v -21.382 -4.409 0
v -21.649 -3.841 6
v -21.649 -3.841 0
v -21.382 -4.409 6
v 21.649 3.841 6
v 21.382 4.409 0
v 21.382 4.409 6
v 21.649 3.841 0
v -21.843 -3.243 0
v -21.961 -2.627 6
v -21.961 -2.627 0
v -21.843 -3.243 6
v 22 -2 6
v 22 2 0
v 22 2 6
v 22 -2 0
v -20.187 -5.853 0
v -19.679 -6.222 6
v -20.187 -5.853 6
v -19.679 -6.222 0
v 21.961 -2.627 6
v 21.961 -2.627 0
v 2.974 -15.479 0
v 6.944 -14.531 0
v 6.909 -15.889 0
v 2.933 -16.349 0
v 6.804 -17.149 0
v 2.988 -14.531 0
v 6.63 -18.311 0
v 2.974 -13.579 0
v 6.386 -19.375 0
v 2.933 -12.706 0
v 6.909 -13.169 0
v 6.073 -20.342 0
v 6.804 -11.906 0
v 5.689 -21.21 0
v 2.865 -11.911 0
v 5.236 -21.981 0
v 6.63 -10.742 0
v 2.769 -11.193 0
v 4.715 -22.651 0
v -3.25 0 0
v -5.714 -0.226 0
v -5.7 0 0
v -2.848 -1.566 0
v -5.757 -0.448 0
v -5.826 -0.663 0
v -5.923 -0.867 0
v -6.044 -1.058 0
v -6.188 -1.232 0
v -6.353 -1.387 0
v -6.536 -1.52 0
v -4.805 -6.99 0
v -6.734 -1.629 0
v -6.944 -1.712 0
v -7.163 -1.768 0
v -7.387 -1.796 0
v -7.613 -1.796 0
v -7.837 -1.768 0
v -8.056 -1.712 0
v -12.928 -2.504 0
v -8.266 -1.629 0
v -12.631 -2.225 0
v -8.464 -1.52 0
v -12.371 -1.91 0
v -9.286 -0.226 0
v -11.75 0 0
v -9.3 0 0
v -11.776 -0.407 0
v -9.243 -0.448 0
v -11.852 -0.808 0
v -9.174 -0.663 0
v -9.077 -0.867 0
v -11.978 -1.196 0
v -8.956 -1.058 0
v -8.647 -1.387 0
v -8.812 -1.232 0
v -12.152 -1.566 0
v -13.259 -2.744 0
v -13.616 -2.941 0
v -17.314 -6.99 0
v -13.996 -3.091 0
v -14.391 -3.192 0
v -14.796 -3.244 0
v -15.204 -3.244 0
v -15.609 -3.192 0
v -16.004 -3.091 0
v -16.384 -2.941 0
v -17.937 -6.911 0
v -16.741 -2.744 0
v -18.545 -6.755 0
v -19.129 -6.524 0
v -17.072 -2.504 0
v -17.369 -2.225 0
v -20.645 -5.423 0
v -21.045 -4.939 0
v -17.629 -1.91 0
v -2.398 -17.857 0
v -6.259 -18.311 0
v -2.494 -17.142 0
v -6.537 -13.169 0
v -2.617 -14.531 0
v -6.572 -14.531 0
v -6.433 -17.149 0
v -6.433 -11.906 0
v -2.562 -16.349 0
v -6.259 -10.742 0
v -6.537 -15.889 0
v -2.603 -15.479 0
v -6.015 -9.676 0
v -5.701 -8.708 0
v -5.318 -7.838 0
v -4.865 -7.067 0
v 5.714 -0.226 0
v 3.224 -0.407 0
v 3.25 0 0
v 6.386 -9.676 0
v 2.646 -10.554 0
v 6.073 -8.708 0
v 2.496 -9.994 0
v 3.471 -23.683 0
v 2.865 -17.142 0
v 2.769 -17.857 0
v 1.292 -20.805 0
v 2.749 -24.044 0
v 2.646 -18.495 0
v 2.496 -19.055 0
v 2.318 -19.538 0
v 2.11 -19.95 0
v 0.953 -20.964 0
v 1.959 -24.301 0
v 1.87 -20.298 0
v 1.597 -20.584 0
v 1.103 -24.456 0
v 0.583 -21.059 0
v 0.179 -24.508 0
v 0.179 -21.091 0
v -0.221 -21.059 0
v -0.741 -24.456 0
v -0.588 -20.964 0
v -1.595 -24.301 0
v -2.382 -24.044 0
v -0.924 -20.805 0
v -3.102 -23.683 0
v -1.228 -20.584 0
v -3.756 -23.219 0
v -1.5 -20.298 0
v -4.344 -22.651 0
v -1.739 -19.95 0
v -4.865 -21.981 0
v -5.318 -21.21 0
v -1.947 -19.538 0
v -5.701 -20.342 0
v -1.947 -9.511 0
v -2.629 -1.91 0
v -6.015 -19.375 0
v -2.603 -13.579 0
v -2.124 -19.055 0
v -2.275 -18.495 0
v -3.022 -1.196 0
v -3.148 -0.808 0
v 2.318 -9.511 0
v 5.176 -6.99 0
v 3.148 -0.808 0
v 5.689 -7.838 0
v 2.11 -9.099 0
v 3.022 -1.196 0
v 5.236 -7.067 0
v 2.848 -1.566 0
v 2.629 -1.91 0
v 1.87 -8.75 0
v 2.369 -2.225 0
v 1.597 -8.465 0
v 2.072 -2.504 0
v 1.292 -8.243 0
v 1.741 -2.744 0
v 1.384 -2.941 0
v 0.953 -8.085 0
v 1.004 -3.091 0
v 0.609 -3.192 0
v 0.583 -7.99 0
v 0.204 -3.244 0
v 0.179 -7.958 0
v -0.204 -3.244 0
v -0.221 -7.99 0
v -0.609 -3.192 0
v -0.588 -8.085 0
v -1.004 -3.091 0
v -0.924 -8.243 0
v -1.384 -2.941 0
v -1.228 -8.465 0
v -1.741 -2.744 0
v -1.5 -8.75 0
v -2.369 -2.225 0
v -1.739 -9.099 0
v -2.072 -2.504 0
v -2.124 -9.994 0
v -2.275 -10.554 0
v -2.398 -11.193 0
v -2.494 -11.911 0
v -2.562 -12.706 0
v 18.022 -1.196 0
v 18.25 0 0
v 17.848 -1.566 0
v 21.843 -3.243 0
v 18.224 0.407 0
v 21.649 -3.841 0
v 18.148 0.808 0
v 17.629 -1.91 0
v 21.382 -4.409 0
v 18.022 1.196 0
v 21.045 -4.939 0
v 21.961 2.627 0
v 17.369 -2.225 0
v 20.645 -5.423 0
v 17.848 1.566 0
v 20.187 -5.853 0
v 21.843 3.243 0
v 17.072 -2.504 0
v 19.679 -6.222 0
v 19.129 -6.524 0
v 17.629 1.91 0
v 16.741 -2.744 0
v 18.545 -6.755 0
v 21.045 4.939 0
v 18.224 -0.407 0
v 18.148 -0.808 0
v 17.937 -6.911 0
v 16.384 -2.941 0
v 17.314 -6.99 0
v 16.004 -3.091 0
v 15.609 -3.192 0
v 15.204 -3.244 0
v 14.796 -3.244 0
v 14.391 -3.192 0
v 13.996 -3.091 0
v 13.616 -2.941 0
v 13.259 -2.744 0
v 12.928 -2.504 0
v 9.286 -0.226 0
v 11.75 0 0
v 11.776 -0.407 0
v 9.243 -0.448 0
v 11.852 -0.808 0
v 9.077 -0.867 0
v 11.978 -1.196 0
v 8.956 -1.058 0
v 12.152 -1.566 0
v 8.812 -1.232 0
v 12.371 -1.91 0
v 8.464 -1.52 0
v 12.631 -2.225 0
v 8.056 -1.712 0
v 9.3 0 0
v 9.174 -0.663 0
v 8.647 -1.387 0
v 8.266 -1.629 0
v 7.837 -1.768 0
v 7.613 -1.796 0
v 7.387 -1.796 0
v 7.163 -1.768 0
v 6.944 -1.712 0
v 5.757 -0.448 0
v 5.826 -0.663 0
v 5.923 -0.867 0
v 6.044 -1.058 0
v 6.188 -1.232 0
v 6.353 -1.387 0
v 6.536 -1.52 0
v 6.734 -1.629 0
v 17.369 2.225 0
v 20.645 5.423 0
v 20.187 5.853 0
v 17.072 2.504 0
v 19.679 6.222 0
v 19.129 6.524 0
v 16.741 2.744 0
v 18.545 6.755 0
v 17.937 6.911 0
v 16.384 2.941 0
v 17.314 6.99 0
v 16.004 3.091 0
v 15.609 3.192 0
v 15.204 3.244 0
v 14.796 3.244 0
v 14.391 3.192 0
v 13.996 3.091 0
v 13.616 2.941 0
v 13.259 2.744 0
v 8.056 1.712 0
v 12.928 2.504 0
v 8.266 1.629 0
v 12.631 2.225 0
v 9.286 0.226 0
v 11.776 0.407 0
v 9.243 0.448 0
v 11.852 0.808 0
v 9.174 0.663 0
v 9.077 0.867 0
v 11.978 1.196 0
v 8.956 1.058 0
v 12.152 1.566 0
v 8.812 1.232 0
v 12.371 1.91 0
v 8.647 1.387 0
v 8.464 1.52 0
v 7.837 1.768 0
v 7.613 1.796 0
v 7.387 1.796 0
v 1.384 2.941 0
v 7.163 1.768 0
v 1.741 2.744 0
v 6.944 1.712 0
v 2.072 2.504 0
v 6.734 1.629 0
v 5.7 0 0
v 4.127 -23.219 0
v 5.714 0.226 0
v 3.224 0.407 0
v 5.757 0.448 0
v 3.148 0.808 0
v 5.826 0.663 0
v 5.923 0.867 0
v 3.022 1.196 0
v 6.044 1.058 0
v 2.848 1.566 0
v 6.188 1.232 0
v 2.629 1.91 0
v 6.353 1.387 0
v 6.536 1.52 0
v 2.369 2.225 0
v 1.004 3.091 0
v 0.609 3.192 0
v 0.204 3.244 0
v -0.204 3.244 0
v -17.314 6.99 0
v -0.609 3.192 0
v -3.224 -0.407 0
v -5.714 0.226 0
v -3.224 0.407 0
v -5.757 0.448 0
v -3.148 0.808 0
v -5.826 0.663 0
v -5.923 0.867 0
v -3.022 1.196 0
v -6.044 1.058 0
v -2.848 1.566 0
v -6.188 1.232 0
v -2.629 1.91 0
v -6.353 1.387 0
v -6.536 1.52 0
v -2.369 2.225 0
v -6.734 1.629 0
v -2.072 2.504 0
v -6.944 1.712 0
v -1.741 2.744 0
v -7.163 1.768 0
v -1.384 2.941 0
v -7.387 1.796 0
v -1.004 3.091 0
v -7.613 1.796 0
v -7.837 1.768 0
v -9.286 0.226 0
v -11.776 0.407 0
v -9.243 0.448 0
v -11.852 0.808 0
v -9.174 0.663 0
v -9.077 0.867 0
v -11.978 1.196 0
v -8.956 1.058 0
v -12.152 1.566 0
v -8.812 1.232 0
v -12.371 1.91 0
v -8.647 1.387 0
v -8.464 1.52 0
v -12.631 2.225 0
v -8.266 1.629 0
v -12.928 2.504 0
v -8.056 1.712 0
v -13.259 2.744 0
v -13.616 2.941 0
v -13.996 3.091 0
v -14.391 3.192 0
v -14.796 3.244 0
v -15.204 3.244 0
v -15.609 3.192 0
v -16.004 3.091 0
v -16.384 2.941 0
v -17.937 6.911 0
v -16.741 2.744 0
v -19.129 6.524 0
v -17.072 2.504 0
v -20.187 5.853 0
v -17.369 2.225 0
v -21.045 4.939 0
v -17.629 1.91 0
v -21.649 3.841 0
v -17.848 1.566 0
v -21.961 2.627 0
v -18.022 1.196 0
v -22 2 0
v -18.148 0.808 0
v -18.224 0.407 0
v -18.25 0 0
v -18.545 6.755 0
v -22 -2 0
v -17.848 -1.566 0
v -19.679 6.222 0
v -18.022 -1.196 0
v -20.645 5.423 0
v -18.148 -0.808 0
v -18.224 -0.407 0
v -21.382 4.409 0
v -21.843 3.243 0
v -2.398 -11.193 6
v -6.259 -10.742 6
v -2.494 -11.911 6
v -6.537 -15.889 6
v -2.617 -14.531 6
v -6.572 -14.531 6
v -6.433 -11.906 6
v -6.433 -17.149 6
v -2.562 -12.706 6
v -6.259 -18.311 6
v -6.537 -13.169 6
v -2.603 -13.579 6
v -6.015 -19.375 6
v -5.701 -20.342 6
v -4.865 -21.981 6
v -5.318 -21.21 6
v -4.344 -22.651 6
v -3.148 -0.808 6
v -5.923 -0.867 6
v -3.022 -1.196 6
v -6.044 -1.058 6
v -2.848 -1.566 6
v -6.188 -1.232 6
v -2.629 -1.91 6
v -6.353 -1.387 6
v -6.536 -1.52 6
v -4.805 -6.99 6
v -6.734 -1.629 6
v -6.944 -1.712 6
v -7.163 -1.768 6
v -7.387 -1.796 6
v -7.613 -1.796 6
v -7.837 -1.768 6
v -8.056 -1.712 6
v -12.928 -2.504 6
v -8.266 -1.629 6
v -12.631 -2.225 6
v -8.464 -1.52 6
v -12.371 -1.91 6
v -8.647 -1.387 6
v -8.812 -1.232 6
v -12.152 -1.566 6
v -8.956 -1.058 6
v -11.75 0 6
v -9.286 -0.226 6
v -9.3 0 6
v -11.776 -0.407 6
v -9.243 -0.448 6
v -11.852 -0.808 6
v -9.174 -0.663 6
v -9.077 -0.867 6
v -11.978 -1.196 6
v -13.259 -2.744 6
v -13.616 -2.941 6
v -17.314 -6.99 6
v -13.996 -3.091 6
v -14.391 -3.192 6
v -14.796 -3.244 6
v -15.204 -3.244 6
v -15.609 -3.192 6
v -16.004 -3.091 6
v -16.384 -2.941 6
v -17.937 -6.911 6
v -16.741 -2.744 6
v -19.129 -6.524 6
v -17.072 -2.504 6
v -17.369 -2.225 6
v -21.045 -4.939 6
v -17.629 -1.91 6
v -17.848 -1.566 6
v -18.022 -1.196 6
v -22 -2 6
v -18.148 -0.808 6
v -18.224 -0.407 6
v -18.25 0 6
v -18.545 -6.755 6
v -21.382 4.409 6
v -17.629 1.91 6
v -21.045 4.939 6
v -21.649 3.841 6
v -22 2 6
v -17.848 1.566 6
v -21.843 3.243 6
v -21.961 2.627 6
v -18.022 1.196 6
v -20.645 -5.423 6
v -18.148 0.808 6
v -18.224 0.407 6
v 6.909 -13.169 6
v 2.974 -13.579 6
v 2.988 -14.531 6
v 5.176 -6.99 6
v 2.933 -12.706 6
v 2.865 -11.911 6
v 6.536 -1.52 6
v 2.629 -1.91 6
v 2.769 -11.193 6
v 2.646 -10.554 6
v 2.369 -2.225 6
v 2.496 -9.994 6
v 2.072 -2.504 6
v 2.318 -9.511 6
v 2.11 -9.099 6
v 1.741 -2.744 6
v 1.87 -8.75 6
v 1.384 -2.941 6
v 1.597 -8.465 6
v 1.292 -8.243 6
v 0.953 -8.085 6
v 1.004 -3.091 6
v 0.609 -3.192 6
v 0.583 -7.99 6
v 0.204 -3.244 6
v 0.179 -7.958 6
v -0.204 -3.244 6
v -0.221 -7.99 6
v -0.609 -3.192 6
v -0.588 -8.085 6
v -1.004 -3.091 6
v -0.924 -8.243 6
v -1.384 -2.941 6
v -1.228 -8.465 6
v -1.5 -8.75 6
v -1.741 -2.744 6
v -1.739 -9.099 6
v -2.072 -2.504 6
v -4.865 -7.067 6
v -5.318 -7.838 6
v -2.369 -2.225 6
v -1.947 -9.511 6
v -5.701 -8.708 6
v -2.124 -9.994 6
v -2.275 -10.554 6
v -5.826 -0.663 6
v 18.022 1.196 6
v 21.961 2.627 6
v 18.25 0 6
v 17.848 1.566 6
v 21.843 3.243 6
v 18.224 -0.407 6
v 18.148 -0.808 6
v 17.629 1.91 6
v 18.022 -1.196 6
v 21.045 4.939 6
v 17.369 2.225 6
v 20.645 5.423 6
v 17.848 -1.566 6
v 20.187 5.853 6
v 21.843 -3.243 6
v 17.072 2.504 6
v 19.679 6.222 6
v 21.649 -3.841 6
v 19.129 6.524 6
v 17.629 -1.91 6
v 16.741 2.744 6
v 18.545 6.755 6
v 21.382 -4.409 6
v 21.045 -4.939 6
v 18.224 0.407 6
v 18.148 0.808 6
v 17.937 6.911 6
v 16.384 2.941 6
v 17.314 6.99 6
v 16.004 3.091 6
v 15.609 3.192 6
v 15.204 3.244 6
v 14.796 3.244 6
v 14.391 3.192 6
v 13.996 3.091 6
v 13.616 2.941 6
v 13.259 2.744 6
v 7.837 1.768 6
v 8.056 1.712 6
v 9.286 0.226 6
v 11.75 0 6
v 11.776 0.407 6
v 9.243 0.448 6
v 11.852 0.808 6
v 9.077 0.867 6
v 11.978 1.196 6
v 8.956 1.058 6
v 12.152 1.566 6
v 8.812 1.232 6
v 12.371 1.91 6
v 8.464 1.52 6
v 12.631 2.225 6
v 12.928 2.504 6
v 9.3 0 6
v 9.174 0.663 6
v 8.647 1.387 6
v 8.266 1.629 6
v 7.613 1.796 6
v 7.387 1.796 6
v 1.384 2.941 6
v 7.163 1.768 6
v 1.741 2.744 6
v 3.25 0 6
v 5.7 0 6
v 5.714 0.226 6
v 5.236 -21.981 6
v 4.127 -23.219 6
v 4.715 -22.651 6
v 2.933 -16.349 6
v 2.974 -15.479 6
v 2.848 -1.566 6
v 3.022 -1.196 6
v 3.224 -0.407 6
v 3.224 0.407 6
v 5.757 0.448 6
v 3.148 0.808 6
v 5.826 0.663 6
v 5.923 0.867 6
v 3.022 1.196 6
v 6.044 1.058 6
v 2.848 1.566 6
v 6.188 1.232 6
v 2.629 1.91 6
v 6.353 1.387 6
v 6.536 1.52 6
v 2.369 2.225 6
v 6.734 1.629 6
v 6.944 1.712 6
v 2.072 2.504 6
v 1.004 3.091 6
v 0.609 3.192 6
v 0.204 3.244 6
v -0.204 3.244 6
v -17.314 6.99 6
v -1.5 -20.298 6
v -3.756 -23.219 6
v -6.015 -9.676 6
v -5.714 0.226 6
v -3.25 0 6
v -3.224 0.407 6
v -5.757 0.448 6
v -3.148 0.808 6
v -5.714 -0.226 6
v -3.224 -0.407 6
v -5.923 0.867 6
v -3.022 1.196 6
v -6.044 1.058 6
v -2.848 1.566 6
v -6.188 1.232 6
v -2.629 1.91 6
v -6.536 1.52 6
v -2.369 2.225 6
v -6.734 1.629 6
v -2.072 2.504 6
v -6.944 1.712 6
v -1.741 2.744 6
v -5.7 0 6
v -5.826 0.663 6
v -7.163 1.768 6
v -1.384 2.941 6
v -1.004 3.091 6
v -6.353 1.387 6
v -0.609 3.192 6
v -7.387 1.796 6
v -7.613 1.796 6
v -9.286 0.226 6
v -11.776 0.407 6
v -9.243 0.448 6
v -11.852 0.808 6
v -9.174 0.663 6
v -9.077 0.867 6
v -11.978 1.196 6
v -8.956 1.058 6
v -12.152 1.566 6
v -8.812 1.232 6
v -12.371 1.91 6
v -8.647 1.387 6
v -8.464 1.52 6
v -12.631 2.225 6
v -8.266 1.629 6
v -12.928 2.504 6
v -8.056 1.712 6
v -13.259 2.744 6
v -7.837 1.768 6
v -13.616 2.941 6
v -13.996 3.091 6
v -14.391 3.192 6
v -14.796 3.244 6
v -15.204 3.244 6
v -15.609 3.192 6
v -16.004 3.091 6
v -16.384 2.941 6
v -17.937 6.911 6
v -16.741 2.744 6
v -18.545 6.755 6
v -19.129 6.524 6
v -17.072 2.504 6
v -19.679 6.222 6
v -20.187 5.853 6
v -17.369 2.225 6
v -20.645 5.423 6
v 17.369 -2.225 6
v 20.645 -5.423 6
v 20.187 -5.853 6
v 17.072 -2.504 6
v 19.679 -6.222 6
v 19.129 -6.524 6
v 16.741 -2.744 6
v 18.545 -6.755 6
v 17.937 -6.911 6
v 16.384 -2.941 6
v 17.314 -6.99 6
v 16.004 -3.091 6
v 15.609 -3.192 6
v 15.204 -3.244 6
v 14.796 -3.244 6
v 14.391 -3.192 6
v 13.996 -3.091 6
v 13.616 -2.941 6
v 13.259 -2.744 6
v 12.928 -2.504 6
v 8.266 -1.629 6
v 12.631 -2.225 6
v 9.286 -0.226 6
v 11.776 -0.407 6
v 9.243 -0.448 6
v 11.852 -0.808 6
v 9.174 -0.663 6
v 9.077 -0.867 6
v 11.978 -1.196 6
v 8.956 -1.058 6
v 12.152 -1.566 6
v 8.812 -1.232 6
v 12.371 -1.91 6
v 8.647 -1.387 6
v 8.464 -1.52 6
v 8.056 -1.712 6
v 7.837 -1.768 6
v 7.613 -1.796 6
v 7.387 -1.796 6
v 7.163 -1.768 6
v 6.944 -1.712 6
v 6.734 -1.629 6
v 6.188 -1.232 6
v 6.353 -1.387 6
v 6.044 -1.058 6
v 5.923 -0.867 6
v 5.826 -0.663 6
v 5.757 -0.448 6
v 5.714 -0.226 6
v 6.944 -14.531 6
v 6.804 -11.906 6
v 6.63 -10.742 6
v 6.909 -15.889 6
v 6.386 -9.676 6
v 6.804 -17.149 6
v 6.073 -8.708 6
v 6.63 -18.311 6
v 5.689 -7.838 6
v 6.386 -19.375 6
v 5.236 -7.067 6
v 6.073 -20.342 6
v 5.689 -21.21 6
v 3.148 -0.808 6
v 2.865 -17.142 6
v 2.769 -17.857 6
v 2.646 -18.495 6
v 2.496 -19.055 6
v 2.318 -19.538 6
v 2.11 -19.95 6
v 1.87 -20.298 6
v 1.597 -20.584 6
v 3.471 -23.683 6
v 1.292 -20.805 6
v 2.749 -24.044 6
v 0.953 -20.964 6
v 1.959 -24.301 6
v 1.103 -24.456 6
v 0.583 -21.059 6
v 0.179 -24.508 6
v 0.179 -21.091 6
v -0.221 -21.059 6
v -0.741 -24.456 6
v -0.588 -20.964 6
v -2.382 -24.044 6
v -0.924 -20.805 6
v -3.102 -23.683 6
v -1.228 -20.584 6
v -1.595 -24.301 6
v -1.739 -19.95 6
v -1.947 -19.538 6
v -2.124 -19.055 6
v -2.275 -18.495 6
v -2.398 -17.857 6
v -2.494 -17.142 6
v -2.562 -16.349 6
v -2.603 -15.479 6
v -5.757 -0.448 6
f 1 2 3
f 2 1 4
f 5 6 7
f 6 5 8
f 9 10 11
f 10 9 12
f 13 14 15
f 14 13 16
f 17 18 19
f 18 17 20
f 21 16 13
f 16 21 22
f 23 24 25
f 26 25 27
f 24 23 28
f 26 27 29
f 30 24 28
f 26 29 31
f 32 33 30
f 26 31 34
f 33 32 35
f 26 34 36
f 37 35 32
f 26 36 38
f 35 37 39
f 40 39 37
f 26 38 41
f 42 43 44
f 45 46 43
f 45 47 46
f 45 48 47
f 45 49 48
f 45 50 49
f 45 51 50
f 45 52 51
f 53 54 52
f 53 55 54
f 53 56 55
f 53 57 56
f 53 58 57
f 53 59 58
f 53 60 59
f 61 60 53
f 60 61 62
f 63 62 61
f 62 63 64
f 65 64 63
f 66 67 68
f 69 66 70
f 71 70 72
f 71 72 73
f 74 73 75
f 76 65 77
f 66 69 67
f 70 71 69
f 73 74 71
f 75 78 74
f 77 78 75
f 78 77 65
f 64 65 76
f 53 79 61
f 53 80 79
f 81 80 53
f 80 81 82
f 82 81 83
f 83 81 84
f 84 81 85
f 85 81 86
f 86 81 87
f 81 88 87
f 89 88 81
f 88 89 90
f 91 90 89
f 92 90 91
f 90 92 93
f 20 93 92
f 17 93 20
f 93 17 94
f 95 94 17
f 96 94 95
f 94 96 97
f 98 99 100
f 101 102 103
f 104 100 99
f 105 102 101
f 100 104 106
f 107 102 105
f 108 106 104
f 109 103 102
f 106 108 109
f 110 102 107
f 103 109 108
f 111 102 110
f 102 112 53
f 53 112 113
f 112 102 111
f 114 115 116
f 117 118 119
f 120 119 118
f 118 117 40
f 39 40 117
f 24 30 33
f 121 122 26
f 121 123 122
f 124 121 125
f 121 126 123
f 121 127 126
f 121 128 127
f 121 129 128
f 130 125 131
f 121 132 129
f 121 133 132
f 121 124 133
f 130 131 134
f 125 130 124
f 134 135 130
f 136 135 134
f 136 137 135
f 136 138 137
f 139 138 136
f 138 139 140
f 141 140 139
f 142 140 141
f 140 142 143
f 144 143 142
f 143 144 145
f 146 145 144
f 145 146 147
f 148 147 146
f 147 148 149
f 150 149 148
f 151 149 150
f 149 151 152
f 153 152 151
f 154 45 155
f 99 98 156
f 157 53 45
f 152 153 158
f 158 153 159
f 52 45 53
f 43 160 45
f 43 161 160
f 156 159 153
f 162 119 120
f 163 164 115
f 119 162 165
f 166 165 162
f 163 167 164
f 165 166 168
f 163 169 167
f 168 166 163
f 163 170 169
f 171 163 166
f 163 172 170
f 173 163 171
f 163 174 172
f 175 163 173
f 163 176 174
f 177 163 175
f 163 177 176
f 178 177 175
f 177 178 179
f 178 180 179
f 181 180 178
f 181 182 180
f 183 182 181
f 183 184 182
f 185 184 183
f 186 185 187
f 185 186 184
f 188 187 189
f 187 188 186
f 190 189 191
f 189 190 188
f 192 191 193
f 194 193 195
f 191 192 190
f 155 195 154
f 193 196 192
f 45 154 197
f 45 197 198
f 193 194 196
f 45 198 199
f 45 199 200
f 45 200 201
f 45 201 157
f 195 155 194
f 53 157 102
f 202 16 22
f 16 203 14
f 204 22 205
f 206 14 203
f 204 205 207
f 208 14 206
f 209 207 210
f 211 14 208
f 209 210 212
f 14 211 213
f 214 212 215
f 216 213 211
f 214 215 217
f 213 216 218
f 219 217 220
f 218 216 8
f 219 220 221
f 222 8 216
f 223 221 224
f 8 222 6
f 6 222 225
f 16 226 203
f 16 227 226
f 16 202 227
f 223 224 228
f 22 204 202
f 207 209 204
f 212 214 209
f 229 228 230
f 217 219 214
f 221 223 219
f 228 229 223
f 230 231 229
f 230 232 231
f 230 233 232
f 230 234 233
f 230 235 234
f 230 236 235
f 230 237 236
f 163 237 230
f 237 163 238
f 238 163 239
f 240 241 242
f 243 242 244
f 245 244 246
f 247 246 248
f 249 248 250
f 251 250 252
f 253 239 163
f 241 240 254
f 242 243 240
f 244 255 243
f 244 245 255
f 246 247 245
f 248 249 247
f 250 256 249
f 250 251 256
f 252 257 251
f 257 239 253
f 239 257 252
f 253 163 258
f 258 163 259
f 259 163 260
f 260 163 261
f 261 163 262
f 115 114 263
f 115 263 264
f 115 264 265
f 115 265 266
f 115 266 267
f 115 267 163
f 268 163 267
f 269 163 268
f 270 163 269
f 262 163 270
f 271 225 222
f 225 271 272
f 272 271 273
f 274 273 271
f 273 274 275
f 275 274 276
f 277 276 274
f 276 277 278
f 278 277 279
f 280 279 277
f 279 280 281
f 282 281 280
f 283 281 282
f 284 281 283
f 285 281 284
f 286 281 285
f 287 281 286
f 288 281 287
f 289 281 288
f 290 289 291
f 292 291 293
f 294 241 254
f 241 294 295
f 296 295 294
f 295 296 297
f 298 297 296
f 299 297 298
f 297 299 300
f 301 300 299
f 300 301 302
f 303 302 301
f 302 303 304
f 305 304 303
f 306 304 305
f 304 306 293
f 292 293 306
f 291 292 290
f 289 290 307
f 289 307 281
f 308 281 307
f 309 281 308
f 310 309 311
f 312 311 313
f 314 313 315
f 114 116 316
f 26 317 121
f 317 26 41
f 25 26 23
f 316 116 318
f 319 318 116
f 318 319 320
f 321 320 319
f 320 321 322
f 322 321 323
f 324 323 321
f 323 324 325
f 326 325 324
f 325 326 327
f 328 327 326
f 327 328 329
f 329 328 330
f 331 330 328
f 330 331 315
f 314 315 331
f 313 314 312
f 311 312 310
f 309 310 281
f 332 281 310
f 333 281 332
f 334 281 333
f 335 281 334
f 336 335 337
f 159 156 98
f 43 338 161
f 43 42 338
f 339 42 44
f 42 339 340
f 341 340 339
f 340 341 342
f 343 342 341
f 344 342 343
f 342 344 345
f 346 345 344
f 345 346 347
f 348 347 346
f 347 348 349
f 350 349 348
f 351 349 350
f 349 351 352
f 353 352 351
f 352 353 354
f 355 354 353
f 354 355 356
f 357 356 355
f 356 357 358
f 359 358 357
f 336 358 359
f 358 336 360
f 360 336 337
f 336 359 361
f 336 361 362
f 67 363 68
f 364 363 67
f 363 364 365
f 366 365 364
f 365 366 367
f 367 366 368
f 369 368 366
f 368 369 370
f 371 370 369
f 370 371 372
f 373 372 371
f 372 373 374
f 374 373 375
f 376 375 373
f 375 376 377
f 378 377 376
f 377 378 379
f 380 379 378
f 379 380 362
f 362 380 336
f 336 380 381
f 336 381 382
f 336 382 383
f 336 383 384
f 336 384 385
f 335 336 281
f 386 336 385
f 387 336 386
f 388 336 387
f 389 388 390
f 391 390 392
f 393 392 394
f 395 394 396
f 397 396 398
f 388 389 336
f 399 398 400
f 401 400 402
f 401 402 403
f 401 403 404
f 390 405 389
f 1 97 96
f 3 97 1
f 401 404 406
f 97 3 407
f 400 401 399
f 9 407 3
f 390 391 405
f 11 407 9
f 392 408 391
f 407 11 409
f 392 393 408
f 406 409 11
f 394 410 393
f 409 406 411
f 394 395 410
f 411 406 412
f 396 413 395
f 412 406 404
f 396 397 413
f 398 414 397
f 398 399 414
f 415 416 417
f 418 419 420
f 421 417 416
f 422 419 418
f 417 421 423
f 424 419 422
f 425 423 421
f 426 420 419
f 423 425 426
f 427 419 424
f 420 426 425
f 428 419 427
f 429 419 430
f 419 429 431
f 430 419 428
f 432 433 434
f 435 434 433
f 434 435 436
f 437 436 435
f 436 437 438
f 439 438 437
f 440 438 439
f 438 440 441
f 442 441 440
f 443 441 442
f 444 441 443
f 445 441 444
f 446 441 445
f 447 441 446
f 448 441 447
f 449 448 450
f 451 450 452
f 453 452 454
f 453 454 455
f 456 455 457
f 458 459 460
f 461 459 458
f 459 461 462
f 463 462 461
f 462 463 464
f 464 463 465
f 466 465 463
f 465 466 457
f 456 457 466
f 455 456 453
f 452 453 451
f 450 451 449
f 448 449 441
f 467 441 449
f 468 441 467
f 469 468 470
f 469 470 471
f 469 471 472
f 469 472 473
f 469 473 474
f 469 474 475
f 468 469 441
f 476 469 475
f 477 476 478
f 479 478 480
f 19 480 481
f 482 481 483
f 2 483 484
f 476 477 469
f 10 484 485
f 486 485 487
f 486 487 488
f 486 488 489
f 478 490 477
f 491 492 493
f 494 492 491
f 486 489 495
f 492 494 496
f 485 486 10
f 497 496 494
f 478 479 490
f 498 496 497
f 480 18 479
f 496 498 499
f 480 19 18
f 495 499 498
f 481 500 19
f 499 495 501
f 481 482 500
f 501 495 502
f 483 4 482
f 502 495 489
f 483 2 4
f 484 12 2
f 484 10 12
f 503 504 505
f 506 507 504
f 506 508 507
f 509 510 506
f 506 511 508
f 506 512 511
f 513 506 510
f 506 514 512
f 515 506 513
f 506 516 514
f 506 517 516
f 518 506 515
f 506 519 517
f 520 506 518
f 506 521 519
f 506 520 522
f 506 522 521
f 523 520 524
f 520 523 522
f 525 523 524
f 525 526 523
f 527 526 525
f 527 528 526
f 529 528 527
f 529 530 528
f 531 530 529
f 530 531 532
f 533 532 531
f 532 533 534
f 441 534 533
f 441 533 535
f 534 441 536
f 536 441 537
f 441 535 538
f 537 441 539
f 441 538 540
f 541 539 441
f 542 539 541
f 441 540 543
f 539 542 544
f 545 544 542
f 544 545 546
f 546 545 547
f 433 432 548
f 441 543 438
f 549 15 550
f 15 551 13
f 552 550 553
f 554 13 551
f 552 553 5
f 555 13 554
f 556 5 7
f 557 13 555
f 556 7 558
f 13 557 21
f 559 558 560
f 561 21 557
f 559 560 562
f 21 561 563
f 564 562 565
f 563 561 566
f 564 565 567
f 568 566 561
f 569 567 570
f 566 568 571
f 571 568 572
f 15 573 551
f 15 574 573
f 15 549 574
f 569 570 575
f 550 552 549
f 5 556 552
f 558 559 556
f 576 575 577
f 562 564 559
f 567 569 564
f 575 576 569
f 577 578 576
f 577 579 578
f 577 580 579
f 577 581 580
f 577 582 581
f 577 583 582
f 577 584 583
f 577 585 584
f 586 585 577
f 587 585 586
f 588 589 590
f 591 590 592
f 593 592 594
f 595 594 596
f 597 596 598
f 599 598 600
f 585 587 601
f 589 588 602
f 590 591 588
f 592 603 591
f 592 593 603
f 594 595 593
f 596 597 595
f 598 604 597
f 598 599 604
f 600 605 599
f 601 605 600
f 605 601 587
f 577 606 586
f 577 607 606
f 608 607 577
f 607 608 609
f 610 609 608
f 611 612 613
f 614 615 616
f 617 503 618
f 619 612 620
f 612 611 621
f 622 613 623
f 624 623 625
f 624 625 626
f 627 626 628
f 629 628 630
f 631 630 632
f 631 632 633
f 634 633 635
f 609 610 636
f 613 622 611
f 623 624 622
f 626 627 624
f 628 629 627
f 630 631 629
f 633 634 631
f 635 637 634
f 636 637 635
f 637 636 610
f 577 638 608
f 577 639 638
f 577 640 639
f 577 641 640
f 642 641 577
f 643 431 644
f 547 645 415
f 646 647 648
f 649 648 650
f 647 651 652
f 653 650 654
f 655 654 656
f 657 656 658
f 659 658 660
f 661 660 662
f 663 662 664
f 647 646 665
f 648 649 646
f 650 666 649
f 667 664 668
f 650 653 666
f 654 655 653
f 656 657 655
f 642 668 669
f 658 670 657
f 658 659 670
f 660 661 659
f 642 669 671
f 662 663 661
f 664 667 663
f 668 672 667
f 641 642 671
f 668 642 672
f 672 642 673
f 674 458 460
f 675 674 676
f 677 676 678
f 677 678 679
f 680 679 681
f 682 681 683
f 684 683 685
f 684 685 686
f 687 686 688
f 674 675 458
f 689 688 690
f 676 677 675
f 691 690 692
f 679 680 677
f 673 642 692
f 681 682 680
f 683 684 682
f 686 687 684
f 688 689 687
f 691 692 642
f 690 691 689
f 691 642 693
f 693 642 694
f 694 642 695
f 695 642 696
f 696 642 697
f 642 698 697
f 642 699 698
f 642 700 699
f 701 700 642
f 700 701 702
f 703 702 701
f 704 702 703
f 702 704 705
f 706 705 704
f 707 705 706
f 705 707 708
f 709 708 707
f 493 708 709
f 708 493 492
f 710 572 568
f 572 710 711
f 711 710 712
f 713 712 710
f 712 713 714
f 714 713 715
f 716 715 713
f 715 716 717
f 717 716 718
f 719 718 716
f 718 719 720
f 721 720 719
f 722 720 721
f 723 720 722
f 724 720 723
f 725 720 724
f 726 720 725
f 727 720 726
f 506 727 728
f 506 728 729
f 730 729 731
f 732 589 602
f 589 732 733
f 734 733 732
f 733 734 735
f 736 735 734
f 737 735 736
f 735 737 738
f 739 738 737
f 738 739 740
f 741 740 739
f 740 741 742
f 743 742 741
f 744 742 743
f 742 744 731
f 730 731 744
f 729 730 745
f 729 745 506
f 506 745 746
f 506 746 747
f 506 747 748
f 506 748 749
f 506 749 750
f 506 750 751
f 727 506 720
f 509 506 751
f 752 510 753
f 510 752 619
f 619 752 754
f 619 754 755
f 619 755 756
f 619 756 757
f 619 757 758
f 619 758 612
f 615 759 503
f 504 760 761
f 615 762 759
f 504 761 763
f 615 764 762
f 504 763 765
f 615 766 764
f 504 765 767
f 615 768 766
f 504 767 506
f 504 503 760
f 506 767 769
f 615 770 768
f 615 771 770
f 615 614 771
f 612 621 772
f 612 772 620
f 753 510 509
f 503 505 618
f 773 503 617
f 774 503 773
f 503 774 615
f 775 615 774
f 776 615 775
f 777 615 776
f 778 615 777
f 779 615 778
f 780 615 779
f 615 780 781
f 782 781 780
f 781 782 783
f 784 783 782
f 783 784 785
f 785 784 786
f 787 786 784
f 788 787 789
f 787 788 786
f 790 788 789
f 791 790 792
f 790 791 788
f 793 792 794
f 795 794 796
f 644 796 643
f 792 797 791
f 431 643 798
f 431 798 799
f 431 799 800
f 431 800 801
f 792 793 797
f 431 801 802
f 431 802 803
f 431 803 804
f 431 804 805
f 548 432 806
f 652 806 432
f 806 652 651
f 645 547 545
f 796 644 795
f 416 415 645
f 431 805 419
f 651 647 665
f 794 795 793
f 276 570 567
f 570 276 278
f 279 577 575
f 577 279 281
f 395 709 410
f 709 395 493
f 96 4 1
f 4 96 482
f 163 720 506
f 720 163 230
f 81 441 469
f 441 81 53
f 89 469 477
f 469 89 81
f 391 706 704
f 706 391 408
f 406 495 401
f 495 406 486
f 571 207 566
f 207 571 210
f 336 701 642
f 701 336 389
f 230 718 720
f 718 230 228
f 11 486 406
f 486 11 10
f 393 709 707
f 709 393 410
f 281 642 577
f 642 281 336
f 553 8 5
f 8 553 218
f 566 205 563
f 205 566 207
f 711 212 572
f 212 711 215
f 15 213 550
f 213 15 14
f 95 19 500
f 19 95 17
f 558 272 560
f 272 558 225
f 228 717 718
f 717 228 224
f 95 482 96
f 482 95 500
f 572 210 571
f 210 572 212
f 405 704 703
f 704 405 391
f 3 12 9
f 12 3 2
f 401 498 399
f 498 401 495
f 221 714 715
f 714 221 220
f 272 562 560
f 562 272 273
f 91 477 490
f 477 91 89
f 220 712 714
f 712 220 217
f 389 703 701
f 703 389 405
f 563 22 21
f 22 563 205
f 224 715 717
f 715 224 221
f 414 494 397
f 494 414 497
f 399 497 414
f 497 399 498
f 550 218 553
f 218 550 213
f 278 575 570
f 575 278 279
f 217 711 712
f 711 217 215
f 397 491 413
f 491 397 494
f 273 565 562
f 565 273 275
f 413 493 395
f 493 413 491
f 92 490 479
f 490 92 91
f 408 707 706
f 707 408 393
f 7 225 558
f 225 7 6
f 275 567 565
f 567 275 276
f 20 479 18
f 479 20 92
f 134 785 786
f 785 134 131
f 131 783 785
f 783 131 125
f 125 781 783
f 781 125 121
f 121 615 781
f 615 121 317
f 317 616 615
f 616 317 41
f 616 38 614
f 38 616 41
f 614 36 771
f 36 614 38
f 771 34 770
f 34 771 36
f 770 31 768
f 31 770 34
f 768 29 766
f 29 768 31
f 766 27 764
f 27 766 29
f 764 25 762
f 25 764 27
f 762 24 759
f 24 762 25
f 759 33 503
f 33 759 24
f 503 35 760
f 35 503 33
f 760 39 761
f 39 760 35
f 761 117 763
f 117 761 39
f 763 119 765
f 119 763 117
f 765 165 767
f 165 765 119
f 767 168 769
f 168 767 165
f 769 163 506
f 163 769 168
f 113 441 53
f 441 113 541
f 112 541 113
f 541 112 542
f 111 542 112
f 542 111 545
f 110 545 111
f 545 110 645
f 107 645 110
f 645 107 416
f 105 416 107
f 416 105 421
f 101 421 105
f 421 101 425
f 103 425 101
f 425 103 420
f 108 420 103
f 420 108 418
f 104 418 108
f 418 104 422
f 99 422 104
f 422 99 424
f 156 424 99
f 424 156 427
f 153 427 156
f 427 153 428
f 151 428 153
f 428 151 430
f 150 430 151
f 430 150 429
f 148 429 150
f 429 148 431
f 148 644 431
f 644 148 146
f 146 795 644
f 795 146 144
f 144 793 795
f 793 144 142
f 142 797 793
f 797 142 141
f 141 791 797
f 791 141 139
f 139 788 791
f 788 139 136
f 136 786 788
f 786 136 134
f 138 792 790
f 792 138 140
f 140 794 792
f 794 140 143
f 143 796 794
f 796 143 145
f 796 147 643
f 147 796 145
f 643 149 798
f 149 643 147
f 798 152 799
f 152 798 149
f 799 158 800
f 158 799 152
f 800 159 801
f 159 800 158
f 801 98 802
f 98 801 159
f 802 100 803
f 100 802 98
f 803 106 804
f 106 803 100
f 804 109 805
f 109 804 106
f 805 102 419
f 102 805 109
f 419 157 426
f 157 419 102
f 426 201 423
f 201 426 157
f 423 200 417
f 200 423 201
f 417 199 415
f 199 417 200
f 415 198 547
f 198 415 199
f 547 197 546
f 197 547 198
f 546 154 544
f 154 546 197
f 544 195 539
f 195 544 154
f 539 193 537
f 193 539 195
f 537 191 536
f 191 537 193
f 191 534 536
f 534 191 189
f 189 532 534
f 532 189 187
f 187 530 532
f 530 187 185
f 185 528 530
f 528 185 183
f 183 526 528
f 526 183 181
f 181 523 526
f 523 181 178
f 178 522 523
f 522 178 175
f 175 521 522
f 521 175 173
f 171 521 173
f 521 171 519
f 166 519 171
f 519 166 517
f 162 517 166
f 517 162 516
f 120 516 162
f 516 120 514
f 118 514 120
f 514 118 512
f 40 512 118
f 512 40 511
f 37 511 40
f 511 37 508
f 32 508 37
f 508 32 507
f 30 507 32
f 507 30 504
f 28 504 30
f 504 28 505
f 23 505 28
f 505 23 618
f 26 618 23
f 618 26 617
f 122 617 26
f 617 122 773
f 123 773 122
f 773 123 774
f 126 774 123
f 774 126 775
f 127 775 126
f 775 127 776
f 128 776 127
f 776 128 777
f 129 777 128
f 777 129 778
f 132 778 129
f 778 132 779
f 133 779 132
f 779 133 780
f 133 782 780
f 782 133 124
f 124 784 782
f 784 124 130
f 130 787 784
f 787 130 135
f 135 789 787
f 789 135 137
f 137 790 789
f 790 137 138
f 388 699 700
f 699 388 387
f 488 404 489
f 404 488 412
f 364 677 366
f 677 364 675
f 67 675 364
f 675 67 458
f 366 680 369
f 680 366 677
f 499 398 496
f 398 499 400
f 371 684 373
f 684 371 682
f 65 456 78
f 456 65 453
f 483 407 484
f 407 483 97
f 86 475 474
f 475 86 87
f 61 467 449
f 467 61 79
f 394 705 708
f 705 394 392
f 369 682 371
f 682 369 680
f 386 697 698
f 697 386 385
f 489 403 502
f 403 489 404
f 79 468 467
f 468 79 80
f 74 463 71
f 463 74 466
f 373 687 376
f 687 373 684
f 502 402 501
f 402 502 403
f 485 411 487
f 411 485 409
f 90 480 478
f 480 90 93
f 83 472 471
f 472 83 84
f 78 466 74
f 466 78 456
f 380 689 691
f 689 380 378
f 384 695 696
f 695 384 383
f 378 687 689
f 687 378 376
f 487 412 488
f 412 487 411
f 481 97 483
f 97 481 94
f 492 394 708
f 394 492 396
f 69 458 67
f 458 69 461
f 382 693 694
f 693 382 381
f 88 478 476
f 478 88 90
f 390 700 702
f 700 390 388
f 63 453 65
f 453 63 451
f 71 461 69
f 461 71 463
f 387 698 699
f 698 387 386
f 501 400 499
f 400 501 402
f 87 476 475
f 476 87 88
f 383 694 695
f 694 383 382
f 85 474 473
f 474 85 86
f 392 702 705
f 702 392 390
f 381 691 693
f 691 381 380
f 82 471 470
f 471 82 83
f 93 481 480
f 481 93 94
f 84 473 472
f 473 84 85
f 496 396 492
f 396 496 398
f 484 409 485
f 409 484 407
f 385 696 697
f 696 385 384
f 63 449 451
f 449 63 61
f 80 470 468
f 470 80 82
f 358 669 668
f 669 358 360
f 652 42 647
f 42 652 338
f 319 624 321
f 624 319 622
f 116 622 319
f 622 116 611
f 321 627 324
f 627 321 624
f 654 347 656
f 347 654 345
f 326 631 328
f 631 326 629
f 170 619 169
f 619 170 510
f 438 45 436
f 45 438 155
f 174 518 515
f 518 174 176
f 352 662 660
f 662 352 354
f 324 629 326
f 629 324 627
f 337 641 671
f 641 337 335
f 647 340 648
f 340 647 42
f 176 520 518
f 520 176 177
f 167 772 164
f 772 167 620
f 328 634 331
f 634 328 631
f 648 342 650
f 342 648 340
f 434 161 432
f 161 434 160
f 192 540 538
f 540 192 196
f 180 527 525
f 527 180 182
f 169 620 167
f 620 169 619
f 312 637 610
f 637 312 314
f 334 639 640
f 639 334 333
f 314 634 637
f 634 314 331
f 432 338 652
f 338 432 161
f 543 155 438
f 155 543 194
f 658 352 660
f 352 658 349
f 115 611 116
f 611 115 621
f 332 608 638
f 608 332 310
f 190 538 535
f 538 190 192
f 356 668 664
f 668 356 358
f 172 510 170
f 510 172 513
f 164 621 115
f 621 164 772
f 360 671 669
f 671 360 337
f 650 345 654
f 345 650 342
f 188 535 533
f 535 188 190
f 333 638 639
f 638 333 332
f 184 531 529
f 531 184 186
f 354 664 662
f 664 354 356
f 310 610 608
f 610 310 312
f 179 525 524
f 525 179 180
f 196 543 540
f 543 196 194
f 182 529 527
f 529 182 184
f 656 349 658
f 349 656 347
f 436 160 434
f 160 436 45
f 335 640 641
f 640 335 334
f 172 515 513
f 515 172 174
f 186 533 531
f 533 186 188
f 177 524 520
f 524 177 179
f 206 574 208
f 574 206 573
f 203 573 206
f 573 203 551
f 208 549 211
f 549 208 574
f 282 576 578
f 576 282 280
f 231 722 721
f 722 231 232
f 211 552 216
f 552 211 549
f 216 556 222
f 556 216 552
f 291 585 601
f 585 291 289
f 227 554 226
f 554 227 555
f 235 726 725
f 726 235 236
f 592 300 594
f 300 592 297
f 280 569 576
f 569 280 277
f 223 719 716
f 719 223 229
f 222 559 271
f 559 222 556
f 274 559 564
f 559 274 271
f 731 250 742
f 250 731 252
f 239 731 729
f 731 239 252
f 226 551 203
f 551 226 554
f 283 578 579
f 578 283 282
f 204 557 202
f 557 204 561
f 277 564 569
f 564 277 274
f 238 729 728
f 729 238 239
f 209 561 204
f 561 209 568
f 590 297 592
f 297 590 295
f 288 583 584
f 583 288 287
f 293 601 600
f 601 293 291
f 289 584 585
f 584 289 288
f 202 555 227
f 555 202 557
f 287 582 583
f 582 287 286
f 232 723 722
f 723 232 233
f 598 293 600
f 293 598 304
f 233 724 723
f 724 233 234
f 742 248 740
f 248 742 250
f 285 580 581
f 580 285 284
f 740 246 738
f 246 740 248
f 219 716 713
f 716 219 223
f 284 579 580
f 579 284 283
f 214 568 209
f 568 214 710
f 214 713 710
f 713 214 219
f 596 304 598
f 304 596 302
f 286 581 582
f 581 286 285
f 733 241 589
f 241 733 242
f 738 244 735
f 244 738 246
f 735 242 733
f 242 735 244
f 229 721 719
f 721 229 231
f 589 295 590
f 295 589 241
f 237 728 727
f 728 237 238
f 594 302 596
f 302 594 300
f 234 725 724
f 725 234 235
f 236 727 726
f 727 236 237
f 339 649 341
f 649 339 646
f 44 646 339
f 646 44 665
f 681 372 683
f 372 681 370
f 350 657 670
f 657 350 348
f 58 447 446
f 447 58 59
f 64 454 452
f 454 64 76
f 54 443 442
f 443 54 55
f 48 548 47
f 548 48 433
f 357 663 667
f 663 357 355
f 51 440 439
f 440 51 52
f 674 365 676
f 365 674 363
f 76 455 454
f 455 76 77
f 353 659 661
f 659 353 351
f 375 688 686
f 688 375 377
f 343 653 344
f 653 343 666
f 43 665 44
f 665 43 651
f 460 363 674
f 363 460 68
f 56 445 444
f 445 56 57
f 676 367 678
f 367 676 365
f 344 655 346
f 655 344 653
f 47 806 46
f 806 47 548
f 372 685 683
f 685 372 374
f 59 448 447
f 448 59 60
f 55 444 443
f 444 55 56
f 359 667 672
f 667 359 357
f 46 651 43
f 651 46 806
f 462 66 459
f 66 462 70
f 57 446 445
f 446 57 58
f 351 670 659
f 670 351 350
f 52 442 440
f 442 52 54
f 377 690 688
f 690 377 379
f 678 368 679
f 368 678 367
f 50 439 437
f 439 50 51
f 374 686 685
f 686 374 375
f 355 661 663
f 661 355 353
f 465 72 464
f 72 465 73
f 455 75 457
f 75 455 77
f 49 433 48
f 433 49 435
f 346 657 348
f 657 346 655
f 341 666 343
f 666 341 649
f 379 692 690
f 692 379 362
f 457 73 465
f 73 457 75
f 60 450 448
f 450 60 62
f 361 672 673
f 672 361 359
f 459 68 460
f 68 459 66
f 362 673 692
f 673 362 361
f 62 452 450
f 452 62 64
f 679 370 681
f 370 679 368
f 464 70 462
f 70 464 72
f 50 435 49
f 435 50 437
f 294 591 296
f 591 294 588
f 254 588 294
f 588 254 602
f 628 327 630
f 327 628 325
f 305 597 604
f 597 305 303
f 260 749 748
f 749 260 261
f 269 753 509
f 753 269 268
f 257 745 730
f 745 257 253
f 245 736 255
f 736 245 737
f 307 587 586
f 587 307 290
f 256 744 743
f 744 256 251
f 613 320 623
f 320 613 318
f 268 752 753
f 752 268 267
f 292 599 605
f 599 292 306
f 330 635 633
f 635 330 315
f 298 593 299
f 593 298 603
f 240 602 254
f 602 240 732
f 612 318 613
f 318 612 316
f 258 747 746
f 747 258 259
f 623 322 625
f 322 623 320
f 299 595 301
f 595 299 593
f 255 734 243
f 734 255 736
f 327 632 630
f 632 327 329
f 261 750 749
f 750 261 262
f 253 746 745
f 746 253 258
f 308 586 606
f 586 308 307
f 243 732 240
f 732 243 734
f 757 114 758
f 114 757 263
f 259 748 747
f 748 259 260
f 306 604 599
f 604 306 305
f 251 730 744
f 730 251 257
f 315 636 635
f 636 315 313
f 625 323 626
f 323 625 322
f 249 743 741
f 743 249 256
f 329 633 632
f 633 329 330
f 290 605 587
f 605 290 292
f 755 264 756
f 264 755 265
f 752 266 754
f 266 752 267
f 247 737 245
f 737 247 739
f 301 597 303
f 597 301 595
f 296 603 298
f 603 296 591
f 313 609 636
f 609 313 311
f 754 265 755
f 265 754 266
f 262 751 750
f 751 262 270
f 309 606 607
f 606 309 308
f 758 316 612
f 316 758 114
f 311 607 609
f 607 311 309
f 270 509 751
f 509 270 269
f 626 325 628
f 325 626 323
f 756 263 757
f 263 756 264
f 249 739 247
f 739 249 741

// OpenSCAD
$fn = 50;


difference() {
	union() {
		hull() {
			translate(v = [-17.0000000000, 2.0000000000, 0]) {
				cylinder(h = 6, r = 5);
			}
			translate(v = [17.0000000000, 2.0000000000, 0]) {
				cylinder(h = 6, r = 5);
			}
			translate(v = [-17.0000000000, -2.0000000000, 0]) {
				cylinder(h = 6, r = 5);
			}
			translate(v = [17.0000000000, -2.0000000000, 0]) {
				cylinder(h = 6, r = 5);
			}
		}
		translate(v = [0, -5, 0]) {
			linear_extrude(height = 6) {
				text(font = "DejaVu Sans Mono:style=Bold", halign = "center", size = 19.0000000000, text = "O", valign = "top");
			}
		}
	}
	union() {
		translate(v = [-15.0000000000, 0.0000000000, 0]) {
			translate(v = [0, 0, -100]) {
				cylinder(h = 200, r = 3.2500000000);
			}
		}
		translate(v = [0, 0, -100]) {
			cylinder(h = 200, r = 3.2500000000);
		}
		translate(v = [15.0000000000, 0.0000000000, 0]) {
			translate(v = [0, 0, -100]) {
				cylinder(h = 200, r = 3.2500000000);
			}
		}
		translate(v = [-15.0000000000, 0.0000000000, 0]) {
			translate(v = [0, 0, -100]) {
				cylinder(h = 200, r = 1.8000000000);
			}
		}
		translate(v = [-7.5000000000, 0.0000000000, 0]) {
			translate(v = [0, 0, -100]) {
				cylinder(h = 200, r = 1.8000000000);
			}
		}
		translate(v = [0, 0, -100]) {
			cylinder(h = 200, r = 1.8000000000);
		}
		translate(v = [7.5000000000, 0.0000000000, 0]) {
			translate(v = [0, 0, -100]) {
				cylinder(h = 200, r = 1.8000000000);
			}
		}
		translate(v = [15.0000000000, 0.0000000000, 0]) {
			translate(v = [0, 0, -100]) {
				cylinder(h = 200, r = 1.8000000000);
			}
		}
	}
}
